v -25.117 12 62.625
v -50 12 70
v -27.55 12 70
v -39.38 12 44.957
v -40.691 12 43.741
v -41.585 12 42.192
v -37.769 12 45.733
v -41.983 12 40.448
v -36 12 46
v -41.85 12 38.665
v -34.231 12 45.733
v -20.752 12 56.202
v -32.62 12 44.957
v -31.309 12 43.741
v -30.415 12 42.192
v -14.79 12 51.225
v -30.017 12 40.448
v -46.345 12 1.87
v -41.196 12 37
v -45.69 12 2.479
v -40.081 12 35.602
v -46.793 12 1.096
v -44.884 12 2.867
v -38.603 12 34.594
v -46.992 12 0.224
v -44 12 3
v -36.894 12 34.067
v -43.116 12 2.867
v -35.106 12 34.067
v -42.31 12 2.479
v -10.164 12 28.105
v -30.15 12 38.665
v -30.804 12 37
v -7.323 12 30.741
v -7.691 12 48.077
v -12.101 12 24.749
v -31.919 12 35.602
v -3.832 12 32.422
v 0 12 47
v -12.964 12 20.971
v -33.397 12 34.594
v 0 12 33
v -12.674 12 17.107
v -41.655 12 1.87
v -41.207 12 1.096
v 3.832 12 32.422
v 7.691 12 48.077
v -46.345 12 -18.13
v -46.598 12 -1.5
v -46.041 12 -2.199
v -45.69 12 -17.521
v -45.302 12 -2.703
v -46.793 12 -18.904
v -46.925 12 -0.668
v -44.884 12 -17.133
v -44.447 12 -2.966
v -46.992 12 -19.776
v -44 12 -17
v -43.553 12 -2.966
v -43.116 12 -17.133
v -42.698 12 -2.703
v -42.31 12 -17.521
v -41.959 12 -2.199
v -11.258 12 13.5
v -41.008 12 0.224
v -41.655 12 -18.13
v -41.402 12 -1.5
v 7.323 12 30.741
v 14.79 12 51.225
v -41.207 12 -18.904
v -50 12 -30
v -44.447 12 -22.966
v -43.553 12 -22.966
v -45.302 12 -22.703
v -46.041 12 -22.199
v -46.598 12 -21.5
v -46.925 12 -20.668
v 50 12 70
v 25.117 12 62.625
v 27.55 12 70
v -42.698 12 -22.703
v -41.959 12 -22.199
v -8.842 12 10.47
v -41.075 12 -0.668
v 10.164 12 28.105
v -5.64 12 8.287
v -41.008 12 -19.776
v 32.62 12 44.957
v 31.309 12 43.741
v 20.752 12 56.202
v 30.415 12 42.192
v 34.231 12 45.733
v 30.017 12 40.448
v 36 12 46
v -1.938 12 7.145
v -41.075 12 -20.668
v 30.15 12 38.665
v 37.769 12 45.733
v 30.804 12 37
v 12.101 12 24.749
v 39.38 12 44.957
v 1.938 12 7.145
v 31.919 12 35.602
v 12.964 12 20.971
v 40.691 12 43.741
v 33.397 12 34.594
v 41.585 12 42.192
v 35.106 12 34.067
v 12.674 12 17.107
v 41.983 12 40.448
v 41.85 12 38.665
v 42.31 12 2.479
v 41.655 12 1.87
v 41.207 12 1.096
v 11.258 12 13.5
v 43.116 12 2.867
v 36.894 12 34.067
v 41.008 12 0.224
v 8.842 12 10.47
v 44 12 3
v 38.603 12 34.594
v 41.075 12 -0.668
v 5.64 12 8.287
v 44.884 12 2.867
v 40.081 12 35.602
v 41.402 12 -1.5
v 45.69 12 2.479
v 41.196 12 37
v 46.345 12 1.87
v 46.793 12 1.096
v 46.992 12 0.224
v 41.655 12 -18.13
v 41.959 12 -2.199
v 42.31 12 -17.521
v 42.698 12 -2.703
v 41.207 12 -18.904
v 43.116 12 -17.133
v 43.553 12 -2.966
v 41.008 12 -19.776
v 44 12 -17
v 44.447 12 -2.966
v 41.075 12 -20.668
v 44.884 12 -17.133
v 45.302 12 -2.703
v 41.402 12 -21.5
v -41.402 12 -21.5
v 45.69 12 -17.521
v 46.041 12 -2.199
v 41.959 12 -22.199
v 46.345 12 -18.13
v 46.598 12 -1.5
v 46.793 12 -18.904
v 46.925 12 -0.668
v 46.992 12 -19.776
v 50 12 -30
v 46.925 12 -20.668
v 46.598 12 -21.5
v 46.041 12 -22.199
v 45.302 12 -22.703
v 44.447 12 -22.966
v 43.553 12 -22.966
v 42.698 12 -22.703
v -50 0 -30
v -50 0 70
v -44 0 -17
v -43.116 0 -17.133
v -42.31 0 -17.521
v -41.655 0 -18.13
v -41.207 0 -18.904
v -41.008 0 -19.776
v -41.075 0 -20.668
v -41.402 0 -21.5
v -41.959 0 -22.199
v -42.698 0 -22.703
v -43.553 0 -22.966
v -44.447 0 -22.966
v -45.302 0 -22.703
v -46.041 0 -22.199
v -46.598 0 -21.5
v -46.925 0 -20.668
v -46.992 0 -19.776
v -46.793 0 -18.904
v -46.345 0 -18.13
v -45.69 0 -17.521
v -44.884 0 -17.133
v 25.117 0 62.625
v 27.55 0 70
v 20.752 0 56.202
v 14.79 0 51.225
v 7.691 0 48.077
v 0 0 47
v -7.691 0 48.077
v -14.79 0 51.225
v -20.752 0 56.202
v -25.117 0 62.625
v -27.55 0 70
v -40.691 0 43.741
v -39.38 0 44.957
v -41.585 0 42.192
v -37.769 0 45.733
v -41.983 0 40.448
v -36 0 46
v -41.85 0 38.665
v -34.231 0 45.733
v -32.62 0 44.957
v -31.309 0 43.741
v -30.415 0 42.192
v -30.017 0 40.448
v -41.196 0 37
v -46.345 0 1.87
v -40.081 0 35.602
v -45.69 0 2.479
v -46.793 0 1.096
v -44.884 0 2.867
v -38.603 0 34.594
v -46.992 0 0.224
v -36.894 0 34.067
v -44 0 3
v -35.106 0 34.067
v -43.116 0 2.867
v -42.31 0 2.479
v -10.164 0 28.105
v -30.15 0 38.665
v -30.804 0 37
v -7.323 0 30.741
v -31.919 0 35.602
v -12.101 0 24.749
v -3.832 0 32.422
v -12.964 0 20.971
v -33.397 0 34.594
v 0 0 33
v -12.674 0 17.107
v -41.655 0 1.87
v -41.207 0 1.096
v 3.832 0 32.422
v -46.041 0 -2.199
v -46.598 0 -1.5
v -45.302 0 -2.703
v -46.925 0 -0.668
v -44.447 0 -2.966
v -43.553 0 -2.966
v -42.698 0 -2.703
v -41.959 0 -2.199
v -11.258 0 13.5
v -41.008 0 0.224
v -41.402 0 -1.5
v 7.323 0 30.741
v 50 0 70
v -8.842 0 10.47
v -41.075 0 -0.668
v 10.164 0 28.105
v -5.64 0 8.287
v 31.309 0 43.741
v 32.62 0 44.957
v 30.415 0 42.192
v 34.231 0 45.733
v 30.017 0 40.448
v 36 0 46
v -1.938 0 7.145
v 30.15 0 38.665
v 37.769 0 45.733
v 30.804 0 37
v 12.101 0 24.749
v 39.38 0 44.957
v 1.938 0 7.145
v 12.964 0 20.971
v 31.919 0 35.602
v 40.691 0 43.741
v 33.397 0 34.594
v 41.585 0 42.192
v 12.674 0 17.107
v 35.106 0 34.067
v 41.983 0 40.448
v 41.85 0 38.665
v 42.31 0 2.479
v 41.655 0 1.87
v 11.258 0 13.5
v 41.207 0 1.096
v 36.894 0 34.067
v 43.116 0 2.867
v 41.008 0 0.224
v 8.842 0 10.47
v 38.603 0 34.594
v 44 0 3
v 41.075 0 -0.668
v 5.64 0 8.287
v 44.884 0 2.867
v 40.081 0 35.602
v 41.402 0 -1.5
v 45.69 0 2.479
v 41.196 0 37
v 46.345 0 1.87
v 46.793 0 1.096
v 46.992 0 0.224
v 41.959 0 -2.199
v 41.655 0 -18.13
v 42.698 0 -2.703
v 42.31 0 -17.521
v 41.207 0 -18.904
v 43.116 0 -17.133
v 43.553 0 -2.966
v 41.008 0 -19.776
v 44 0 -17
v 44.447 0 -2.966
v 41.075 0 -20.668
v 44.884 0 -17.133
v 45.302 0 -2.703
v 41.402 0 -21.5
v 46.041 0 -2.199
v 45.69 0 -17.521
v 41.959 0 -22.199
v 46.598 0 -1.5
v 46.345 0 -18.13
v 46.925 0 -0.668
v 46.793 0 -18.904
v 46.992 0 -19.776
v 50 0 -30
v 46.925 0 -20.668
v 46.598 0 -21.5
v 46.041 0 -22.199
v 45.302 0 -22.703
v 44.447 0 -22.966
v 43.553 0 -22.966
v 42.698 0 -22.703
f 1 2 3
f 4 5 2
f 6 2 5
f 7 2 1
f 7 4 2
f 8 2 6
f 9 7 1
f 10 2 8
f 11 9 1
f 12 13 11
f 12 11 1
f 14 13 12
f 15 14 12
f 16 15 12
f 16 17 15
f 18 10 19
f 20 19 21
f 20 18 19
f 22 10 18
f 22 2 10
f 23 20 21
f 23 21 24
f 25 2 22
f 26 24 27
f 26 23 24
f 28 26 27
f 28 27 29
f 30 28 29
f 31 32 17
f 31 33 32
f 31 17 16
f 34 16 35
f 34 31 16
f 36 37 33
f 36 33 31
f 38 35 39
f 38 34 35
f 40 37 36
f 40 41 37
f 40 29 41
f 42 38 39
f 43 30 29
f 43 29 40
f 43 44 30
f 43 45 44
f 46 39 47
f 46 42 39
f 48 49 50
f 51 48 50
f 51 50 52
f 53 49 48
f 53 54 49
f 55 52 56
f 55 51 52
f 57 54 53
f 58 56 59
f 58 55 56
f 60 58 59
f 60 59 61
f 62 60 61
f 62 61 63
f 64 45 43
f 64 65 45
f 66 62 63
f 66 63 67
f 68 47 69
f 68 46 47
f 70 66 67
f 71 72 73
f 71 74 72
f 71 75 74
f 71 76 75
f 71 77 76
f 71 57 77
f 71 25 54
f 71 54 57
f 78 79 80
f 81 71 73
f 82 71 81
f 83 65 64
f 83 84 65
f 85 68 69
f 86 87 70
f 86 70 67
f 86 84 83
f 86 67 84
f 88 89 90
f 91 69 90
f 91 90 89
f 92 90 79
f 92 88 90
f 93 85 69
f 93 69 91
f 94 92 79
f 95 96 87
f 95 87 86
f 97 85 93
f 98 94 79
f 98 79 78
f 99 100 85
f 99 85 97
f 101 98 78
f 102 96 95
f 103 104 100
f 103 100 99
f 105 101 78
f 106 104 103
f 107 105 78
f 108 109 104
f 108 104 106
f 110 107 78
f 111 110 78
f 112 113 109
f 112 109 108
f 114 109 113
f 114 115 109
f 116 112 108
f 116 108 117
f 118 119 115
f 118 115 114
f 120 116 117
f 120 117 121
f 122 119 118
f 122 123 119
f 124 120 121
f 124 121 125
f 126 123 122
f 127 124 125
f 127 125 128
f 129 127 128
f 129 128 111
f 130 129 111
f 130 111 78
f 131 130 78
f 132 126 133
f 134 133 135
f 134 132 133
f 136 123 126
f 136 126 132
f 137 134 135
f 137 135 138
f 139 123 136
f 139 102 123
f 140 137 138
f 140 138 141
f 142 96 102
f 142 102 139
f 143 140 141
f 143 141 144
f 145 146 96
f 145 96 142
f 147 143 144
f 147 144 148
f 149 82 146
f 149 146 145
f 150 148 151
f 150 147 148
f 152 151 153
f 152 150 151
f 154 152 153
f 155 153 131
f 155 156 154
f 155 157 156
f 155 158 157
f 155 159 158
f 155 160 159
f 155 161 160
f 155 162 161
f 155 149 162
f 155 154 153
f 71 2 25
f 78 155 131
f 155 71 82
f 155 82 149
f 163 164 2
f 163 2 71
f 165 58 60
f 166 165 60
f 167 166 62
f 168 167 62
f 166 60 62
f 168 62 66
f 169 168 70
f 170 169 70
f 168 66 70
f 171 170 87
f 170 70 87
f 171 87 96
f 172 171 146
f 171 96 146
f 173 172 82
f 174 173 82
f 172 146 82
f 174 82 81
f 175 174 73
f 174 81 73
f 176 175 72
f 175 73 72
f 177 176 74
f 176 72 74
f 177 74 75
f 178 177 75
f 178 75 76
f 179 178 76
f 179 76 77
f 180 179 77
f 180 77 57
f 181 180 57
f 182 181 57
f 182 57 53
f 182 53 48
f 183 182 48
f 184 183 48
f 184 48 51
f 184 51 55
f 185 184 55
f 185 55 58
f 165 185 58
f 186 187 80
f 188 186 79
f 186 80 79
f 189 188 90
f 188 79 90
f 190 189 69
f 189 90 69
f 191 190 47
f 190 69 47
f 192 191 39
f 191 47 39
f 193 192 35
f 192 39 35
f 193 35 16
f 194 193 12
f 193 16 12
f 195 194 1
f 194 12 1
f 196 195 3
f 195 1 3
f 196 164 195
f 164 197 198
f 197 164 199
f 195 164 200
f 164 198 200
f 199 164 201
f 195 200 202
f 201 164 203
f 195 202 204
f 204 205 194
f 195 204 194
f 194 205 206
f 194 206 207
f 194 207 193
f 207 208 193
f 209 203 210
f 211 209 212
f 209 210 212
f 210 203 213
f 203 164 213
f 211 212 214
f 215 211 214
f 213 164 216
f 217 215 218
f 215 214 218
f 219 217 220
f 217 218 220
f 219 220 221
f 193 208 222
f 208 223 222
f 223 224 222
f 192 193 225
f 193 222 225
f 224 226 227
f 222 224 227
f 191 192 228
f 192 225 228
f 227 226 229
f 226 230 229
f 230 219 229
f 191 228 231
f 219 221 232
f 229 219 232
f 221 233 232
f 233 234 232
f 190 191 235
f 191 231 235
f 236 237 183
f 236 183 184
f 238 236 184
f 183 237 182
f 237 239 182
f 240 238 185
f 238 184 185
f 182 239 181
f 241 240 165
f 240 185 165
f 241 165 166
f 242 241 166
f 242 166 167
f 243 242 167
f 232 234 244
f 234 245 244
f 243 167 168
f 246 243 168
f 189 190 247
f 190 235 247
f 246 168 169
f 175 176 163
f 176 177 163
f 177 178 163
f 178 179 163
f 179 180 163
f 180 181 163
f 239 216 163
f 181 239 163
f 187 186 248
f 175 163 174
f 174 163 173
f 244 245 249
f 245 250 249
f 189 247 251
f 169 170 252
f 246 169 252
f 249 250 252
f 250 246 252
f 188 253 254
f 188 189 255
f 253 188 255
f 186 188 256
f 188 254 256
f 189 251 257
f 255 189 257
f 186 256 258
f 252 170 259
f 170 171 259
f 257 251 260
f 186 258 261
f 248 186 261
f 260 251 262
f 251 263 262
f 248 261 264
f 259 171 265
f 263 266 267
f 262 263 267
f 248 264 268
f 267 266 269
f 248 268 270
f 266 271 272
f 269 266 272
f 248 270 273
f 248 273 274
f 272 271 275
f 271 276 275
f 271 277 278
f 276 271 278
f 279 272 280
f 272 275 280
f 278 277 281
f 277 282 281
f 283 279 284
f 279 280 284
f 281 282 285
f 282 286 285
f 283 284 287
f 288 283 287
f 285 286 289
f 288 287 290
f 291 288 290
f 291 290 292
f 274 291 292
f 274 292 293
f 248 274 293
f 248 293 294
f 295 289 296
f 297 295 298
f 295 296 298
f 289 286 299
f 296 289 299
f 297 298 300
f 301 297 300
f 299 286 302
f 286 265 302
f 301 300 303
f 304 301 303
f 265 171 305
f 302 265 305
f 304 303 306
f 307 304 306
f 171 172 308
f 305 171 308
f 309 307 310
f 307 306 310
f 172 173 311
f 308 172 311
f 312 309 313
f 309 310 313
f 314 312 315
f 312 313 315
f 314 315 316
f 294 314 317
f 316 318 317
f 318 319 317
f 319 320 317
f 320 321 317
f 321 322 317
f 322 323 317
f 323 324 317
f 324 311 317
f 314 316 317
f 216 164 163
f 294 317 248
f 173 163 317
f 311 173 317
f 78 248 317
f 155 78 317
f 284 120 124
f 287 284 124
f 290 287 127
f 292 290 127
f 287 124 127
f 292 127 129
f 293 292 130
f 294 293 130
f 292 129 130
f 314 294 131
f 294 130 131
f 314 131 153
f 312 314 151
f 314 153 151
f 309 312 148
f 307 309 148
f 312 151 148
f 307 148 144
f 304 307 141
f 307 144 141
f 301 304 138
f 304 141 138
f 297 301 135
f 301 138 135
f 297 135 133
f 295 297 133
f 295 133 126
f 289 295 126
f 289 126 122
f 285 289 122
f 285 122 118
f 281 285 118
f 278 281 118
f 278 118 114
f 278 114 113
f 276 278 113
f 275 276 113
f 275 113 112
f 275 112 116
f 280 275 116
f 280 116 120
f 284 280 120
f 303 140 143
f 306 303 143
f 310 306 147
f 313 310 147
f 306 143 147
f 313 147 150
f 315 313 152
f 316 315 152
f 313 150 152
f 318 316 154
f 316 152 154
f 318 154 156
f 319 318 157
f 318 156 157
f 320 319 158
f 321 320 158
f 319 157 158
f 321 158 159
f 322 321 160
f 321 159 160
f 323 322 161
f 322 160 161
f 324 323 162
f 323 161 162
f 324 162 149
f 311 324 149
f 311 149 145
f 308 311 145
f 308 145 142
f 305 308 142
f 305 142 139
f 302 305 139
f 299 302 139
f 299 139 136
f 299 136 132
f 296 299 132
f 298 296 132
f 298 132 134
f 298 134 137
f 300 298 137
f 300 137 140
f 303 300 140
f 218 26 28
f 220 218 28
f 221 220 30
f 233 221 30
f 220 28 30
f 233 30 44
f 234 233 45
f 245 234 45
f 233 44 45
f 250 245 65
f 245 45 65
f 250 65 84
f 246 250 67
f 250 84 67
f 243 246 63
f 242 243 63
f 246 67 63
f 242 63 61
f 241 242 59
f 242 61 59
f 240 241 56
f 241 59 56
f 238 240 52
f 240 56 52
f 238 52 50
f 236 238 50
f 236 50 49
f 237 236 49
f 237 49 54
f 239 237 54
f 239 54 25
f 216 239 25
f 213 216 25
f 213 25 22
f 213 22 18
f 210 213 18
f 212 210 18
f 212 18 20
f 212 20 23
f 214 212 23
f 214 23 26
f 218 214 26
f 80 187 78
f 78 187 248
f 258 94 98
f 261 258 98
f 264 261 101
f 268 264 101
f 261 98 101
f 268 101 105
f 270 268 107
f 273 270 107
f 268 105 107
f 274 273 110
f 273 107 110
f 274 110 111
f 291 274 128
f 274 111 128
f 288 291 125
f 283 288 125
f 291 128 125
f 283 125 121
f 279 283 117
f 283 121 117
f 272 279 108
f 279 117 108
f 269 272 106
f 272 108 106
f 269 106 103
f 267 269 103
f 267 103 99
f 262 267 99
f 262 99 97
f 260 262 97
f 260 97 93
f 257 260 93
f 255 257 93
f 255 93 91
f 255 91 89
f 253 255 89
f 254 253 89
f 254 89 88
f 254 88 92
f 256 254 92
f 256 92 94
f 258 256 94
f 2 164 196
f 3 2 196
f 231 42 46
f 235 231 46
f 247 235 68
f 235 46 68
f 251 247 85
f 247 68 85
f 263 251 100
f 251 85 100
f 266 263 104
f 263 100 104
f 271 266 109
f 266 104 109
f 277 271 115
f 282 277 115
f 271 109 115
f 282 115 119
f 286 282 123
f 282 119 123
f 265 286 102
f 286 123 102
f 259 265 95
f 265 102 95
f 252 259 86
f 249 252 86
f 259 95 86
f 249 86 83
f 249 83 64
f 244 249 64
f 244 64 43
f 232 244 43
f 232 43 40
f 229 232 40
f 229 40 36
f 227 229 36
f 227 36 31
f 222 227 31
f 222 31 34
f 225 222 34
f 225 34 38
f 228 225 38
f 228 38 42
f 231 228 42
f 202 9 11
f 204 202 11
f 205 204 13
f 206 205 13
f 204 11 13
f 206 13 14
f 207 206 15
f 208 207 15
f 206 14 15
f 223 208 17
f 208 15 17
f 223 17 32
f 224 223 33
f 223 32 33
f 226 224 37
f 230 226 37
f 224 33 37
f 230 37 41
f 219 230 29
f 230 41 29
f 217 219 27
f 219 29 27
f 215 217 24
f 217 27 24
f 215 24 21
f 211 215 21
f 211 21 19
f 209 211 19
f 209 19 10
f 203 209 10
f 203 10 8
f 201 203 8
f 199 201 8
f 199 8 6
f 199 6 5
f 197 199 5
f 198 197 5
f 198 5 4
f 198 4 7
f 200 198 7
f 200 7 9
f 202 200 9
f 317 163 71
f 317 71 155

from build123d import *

# Parameters (mm, degrees)
SKETCH1_W           = 100
SKETCH1_H           = 100
BOSS_EXTRUDE1_DEPTH = 12
CUT_EXTRUDE1_REACH  = 88.856
SKETCH2_R           = 3
CUT_EXTRUDE2_REACH  = 88.856
SKETCH3_R           = 13
CUT_EXTRUDE3_REACH  = 88.856
SKETCH4_R           = 6
CUT_EXTRUDE4_REACH  = 88.856
SKETCH5_R           = 28


with BuildPart() as part:
    # Sketch1 → Boss-Extrude1 (new body)
    with BuildSketch(Plane(origin=(0, 0, 0), x_dir=(1, 0, 0), z_dir=(0, 1, 0))):
        with Locations((0, -20)):
            Rectangle(SKETCH1_W, SKETCH1_H)
    extrude(amount=BOSS_EXTRUDE1_DEPTH)

    # Sketch2 → Cut-Extrude1 (cut, up to next)
    with BuildSketch(Plane(origin=(0, 12, 0), x_dir=(1, 0, 0), z_dir=(0, 1, 0)), mode=Mode.PRIVATE) as cut_extrude1_sk1:
        with Locations(Location((-44, 20, 0), (0, 0, 270))):
            Circle(SKETCH2_R)
    cut_extrude1_tool1 = extrude(cut_extrude1_sk1.sketch, amount=-CUT_EXTRUDE1_REACH, mode=Mode.PRIVATE) & part.part
    # Sketch2 → Cut-Extrude1 (cut, up to next)
    with BuildSketch(Plane(origin=(0, 12, 0), x_dir=(1, 0, 0), z_dir=(0, 1, 0)), mode=Mode.PRIVATE) as cut_extrude1_sk2:
        with Locations(Location((-44, 0, 0), (0, 0, 270))):
            Circle(SKETCH2_R)
    cut_extrude1_tool2 = extrude(cut_extrude1_sk2.sketch, amount=-CUT_EXTRUDE1_REACH, mode=Mode.PRIVATE) & part.part
    # Sketch2 → Cut-Extrude1 (cut, up to next)
    with BuildSketch(Plane(origin=(0, 12, 0), x_dir=(1, 0, 0), z_dir=(0, 1, 0)), mode=Mode.PRIVATE) as cut_extrude1_sk3:
        with Locations(Location((44, 20, 0), (0, 0, 270))):
            Circle(SKETCH2_R)
    cut_extrude1_tool3 = extrude(cut_extrude1_sk3.sketch, amount=-CUT_EXTRUDE1_REACH, mode=Mode.PRIVATE) & part.part
    # Sketch2 → Cut-Extrude1 (cut, up to next)
    with BuildSketch(Plane(origin=(0, 12, 0), x_dir=(1, 0, 0), z_dir=(0, 1, 0)), mode=Mode.PRIVATE) as cut_extrude1_sk4:
        with Locations(Location((44, 0, 0), (0, 0, 270))):
            Circle(SKETCH2_R)
    cut_extrude1_tool4 = extrude(cut_extrude1_sk4.sketch, amount=-CUT_EXTRUDE1_REACH, mode=Mode.PRIVATE) & part.part
    add(cut_extrude1_tool1.solids().sort_by_distance((-44, 12, -20))[0], mode=Mode.SUBTRACT)
    add(cut_extrude1_tool2.solids().sort_by_distance((-44, 12, 0))[0], mode=Mode.SUBTRACT)
    add(cut_extrude1_tool3.solids().sort_by_distance((44, 12, -20))[0], mode=Mode.SUBTRACT)
    add(cut_extrude1_tool4.solids().sort_by_distance((44, 12, 0))[0], mode=Mode.SUBTRACT)

    # Sketch3 → Cut-Extrude2 (cut, up to next)
    with BuildSketch(Plane(origin=(0, 12, 0), x_dir=(1, 0, 0), z_dir=(0, 1, 0)), mode=Mode.PRIVATE) as cut_extrude2_sk1:
        with Locations(Location((0, -20, 0), (0, 0, 270))):
            Circle(SKETCH3_R)
    cut_extrude2_tool1 = extrude(cut_extrude2_sk1.sketch, amount=-CUT_EXTRUDE2_REACH, mode=Mode.PRIVATE) & part.part
    add(cut_extrude2_tool1.solids().sort_by_distance((0, 12, 20))[0], mode=Mode.SUBTRACT)

    # Sketch4 → Cut-Extrude3 (cut, up to next)
    with BuildSketch(Plane(origin=(0, 12, 0), x_dir=(1, 0, 0), z_dir=(0, 1, 0)), mode=Mode.PRIVATE) as cut_extrude3_sk1:
        with Locations(Location((-36, -40, 0), (0, 0, 270))):
            Circle(SKETCH4_R)
    cut_extrude3_tool1 = extrude(cut_extrude3_sk1.sketch, amount=-CUT_EXTRUDE3_REACH, mode=Mode.PRIVATE) & part.part
    # Sketch4 → Cut-Extrude3 (cut, up to next)
    with BuildSketch(Plane(origin=(0, 12, 0), x_dir=(1, 0, 0), z_dir=(0, 1, 0)), mode=Mode.PRIVATE) as cut_extrude3_sk2:
        with Locations(Location((36, -40, 0), (0, 0, 270))):
            Circle(SKETCH4_R)
    cut_extrude3_tool2 = extrude(cut_extrude3_sk2.sketch, amount=-CUT_EXTRUDE3_REACH, mode=Mode.PRIVATE) & part.part
    add(cut_extrude3_tool1.solids().sort_by_distance((-36, 12, 40))[0], mode=Mode.SUBTRACT)
    add(cut_extrude3_tool2.solids().sort_by_distance((36, 12, 40))[0], mode=Mode.SUBTRACT)

    # Sketch5 → Cut-Extrude4 (cut, up to next)
    with BuildSketch(Plane(origin=(0, 12, 0), x_dir=(1, 0, 0), z_dir=(0, 1, 0)), mode=Mode.PRIVATE) as cut_extrude4_sk1:
        with Locations((0, -75)):
            Circle(SKETCH5_R)
    cut_extrude4_tool1 = extrude(cut_extrude4_sk1.sketch, amount=-CUT_EXTRUDE4_REACH, mode=Mode.PRIVATE) & part.part
    add(cut_extrude4_tool1.solids().sort_by_distance((0, 12, 75))[0], mode=Mode.SUBTRACT)


solid = part.part
